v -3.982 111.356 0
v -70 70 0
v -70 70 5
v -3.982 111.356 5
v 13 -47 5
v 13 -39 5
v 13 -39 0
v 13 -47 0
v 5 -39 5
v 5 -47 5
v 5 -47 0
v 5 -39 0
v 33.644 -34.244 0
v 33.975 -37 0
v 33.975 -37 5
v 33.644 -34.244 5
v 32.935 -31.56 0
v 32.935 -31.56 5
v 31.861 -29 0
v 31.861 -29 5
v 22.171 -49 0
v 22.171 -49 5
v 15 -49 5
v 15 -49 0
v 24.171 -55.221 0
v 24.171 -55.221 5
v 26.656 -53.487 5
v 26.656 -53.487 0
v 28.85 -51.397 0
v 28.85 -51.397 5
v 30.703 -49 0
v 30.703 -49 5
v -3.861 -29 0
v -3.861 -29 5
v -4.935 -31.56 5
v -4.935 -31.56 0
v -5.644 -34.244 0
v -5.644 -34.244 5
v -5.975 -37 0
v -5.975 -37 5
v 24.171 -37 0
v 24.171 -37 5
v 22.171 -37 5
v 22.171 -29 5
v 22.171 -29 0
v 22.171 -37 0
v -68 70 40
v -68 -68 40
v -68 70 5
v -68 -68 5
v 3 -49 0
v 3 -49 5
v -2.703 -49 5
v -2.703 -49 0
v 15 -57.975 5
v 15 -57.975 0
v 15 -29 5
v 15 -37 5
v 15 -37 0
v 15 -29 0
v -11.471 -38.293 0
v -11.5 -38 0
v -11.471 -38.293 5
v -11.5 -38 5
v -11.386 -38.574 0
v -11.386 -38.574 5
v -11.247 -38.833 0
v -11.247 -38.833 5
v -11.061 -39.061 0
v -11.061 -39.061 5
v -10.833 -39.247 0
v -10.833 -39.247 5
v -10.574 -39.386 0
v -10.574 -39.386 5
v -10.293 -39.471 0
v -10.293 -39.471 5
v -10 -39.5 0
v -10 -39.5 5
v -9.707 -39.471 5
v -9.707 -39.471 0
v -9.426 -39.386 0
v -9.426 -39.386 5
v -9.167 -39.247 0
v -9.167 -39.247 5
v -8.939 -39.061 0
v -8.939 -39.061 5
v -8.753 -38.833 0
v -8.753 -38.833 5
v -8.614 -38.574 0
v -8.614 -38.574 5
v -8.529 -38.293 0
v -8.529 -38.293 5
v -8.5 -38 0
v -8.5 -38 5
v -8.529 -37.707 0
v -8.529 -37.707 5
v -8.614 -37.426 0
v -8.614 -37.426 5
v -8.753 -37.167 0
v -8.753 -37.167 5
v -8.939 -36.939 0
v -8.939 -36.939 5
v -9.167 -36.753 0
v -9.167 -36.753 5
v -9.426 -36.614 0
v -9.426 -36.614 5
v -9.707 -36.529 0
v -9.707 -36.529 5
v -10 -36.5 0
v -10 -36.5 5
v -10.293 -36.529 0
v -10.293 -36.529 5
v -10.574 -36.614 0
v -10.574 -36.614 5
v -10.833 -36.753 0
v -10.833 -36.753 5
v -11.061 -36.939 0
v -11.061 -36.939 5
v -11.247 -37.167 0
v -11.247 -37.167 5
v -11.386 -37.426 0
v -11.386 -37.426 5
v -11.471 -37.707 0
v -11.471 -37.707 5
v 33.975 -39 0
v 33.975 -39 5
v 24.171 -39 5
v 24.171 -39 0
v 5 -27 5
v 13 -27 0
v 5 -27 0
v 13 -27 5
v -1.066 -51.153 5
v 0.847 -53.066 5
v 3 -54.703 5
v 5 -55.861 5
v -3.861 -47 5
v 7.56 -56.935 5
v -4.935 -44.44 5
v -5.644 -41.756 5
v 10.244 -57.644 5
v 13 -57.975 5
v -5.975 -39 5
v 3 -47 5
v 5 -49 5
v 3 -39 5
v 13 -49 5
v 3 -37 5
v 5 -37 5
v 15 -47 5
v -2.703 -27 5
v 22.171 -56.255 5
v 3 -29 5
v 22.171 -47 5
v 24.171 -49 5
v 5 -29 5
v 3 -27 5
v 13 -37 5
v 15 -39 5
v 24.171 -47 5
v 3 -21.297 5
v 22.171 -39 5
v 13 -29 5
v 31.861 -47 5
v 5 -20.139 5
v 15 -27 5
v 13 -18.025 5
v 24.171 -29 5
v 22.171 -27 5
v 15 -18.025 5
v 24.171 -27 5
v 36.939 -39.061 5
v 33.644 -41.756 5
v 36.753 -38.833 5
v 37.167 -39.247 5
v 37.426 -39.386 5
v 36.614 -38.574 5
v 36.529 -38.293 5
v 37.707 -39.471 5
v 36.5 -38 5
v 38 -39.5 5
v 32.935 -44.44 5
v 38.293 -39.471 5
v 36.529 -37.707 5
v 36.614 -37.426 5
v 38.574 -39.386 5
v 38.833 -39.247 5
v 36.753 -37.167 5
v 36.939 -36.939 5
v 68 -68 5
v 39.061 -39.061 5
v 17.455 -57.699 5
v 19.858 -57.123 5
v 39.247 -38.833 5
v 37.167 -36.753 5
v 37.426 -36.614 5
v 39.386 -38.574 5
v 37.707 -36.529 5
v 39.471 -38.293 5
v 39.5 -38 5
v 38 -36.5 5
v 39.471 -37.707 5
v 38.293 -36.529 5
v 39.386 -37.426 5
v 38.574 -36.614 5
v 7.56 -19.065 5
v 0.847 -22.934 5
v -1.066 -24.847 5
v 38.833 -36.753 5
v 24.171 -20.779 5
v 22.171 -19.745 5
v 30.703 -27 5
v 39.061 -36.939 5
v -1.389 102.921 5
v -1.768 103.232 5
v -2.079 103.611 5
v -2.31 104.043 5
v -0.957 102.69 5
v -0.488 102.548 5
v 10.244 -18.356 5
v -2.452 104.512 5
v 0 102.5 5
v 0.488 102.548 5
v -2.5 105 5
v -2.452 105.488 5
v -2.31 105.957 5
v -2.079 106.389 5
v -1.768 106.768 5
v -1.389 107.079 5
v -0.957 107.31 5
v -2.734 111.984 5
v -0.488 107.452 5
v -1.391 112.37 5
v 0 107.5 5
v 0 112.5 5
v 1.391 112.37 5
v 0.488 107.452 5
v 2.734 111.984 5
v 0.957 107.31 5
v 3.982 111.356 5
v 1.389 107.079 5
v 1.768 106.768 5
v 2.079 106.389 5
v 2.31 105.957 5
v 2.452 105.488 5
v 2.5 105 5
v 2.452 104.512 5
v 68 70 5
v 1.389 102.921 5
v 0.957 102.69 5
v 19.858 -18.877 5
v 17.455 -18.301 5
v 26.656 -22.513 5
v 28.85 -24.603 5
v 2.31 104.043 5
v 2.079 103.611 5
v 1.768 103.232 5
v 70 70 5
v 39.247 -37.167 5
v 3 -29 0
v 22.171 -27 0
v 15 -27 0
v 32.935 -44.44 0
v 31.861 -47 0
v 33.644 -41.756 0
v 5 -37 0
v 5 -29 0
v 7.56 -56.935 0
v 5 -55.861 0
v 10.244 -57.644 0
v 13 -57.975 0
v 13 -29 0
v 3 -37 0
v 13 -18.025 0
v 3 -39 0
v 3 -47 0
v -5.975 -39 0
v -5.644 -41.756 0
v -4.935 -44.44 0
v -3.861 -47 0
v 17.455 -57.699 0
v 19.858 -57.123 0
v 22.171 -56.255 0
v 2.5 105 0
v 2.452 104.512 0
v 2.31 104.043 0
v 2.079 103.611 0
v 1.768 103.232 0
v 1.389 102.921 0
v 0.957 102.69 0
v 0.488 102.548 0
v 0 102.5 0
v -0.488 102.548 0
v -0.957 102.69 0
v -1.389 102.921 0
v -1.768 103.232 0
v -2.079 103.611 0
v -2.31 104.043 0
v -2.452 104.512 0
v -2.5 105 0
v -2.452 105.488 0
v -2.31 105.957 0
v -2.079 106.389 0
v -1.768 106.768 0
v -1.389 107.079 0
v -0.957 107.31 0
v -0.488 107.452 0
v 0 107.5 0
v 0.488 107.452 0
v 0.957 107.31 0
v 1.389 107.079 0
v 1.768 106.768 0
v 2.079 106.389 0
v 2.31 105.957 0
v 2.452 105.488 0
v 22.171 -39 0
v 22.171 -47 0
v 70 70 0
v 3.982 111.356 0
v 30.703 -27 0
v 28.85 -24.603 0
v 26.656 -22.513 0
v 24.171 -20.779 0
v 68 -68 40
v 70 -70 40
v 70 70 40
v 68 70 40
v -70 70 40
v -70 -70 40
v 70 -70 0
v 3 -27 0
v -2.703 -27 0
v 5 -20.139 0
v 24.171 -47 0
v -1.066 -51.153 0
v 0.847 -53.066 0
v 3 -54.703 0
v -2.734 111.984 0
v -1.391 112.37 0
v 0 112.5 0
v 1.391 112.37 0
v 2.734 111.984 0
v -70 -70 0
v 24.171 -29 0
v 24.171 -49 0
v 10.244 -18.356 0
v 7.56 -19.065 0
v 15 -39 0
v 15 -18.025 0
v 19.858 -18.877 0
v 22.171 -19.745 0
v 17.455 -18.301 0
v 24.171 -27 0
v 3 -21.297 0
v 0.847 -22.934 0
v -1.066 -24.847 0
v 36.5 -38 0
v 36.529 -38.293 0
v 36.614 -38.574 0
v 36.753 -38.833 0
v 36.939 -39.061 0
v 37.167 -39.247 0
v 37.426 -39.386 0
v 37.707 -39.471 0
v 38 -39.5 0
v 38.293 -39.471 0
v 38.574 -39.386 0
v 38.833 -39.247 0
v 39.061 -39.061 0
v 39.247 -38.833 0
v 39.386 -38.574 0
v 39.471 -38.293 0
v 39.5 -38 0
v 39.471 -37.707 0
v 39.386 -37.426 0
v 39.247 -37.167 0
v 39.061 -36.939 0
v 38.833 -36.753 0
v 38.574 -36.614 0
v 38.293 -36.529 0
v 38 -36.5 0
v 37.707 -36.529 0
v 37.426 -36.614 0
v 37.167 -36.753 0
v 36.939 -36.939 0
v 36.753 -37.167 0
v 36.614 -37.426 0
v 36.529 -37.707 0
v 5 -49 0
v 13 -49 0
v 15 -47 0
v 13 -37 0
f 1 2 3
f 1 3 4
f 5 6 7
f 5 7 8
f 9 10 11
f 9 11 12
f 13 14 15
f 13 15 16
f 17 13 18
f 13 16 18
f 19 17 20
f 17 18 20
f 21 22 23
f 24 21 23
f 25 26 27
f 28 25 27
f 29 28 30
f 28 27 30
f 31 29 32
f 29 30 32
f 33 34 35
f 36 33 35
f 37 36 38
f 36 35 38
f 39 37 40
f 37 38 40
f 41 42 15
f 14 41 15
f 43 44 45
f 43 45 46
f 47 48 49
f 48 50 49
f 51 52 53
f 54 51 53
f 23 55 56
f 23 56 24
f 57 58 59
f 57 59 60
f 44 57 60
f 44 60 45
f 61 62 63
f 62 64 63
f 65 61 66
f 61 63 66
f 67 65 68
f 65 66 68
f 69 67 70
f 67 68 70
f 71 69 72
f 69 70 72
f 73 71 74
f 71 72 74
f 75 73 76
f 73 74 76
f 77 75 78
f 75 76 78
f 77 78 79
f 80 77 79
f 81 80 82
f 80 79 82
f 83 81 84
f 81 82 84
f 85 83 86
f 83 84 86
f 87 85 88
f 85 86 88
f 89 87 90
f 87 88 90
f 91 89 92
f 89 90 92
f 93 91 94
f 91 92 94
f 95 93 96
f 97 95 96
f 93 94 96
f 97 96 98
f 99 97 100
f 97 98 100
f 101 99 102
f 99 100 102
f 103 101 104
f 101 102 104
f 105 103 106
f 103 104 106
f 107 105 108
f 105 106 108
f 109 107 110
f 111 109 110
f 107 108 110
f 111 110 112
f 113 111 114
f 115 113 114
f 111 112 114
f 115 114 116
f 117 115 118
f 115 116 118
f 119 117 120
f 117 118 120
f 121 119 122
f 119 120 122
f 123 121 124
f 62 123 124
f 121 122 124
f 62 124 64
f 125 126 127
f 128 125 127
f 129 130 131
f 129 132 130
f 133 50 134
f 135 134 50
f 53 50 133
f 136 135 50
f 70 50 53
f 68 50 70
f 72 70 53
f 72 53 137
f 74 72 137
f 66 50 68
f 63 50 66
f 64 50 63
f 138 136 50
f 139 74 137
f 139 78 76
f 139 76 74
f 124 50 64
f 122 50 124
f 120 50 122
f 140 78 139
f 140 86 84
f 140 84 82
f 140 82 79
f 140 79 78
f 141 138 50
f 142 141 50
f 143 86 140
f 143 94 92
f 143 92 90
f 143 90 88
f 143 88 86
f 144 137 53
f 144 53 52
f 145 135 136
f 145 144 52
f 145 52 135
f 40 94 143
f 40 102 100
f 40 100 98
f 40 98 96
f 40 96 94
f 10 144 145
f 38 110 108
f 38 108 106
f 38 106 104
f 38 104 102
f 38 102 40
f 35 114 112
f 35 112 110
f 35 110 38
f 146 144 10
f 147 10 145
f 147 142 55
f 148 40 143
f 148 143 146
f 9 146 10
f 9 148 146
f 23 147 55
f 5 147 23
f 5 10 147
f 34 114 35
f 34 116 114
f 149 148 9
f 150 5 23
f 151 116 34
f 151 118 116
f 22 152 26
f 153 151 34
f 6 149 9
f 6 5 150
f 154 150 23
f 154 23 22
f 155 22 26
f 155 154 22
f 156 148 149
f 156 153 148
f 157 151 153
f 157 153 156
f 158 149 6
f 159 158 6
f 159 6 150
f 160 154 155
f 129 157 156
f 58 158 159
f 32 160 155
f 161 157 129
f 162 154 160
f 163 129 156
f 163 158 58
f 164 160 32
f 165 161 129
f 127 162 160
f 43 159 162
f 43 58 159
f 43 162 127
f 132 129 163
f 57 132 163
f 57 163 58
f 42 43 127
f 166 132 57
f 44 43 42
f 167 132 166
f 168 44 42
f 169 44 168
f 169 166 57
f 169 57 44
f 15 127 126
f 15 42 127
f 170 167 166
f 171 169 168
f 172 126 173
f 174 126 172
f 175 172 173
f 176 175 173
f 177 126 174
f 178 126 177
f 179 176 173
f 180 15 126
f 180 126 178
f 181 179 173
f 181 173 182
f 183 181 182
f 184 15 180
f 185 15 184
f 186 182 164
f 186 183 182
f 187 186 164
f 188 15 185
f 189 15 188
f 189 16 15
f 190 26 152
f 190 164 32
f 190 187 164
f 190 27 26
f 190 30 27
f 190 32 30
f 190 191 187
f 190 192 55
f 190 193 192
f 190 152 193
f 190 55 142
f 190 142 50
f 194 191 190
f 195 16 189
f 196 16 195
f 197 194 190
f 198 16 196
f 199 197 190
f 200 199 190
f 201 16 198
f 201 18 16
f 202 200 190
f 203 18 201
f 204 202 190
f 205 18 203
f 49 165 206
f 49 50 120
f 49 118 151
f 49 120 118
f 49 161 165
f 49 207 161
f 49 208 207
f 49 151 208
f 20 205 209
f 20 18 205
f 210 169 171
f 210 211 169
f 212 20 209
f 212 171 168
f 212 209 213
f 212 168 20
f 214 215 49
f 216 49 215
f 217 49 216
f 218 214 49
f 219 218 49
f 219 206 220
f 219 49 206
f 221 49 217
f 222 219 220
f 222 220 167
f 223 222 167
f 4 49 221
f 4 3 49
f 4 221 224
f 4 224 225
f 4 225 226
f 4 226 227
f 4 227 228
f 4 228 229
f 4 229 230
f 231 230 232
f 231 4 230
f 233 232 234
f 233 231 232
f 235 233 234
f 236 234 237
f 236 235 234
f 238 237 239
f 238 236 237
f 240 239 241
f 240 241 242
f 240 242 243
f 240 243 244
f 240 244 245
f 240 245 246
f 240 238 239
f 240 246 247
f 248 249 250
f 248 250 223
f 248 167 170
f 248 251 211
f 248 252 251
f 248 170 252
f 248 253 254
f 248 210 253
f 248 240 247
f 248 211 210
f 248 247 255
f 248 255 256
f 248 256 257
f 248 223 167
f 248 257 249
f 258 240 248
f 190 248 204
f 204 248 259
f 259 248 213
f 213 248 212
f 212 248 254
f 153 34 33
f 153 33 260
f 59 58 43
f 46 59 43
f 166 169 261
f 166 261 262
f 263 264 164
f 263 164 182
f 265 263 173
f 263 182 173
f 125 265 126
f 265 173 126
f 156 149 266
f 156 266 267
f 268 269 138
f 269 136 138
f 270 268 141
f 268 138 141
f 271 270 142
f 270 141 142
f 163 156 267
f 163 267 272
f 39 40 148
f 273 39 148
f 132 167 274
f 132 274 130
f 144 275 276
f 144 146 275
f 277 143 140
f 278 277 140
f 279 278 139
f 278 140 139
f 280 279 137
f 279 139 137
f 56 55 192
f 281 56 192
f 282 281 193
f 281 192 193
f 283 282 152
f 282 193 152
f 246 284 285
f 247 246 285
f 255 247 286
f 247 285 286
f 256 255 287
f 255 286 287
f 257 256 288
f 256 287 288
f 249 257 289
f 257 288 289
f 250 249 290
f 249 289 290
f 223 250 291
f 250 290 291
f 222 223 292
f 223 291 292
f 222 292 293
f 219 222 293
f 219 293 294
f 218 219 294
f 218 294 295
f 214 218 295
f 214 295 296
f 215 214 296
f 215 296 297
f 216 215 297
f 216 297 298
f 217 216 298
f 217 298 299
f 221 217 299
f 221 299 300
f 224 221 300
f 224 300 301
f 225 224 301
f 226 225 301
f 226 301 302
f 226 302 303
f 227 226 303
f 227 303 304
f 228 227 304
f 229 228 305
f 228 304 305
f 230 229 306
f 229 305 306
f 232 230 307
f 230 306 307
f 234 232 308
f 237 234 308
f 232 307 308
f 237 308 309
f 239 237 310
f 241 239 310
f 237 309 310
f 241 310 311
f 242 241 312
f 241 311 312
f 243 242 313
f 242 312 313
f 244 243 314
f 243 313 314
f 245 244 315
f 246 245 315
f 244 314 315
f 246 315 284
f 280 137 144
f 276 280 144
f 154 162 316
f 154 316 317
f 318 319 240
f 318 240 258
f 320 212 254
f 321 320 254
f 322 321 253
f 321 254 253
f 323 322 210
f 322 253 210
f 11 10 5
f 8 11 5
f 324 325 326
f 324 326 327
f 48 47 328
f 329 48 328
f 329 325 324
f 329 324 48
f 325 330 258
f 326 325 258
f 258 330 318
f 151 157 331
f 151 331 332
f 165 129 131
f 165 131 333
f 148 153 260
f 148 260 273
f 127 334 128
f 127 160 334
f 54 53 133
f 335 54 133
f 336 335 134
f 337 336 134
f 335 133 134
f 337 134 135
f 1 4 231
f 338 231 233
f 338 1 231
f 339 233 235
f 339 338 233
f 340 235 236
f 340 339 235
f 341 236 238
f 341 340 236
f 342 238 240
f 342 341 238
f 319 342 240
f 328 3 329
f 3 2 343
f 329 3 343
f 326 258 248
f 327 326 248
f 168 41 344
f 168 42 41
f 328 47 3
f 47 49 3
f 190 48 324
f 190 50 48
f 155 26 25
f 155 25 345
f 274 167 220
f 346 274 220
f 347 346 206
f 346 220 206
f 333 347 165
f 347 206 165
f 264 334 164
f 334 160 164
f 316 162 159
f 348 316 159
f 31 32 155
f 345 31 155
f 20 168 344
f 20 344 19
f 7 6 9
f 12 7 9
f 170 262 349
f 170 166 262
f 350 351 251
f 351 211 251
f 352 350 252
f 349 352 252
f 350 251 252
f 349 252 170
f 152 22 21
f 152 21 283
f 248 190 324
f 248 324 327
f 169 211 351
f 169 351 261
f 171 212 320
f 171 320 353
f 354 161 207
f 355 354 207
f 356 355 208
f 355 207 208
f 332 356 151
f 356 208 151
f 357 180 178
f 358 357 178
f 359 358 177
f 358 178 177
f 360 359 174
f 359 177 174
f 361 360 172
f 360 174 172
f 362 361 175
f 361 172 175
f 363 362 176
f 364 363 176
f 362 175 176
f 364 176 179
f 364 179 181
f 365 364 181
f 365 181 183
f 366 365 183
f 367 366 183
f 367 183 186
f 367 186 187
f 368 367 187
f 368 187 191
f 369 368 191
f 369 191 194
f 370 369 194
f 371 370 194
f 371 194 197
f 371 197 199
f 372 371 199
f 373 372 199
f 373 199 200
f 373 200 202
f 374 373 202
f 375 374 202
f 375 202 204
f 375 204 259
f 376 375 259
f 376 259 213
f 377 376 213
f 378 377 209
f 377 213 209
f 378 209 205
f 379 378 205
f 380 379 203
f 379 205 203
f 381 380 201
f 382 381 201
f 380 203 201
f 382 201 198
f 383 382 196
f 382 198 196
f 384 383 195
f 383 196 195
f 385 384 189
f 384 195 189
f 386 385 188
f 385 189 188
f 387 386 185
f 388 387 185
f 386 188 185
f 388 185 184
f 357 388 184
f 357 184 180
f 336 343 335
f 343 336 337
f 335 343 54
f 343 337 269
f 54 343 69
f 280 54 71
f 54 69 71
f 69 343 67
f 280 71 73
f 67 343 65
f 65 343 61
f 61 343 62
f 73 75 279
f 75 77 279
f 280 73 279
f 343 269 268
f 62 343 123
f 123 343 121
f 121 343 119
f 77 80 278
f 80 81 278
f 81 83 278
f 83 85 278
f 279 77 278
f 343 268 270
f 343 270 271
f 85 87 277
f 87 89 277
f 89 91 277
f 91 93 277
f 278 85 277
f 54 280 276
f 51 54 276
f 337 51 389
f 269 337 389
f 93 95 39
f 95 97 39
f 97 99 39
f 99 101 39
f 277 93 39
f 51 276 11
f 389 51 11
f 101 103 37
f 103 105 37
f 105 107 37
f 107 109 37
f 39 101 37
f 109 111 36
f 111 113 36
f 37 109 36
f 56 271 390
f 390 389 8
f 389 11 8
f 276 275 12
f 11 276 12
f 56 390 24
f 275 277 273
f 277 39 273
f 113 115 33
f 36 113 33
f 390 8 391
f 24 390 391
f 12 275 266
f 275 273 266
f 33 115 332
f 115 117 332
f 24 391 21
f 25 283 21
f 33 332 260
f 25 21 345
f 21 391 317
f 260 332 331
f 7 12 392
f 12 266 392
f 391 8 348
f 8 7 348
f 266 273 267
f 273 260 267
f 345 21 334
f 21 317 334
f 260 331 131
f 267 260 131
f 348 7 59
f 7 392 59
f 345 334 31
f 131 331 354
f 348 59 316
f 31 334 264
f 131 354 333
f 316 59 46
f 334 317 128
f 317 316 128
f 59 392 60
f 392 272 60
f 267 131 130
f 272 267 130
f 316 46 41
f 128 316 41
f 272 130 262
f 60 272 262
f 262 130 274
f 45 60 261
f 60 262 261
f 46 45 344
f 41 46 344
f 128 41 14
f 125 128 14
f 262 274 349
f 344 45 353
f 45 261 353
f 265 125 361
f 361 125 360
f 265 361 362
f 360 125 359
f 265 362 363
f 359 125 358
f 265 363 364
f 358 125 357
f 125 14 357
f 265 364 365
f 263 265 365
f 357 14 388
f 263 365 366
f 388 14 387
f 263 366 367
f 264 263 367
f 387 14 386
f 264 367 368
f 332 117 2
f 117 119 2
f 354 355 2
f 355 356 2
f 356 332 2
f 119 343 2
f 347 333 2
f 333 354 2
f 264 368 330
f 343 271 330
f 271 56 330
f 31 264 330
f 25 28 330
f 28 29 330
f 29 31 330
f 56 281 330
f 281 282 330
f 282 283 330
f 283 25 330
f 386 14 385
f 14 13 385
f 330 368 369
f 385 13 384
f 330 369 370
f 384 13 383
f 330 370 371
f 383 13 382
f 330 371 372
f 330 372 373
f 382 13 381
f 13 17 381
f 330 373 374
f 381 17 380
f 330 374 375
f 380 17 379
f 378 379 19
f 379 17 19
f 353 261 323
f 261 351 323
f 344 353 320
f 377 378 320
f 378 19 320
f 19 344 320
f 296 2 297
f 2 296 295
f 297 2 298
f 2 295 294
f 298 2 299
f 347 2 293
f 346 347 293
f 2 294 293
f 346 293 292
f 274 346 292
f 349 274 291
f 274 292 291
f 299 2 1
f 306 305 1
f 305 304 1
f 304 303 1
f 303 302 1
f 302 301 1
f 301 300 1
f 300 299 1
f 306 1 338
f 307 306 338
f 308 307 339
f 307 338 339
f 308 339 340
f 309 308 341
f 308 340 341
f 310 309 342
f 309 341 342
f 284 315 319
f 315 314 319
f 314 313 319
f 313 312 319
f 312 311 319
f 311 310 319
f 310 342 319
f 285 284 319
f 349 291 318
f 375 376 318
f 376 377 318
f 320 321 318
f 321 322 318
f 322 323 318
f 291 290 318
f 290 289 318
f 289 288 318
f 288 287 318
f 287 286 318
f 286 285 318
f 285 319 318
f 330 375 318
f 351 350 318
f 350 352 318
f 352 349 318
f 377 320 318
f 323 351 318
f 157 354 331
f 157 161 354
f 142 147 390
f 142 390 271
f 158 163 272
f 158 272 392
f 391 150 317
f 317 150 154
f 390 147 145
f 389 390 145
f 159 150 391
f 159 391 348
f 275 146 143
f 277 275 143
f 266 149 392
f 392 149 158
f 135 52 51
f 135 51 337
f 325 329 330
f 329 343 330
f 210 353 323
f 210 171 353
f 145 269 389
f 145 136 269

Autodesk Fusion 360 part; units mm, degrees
sketch "Sketch1" plane through (0, 0, 0) normal (0, 0, 1) x (1, 0, 0)
  line L0 (70, 70) -> (-70, 70)
  line L1 (-70, 70) -> (-70, -70)
  line L2 (-70, -70) -> (70, -70)
  line L3 (70, -70) -> (70, 70)
  line L4 (70, 70) -> (-70, -70) construction
  line L5 (-70, 70) -> (70, -70) construction
  line L6 (0, 70) -> (0, 105)
  line L7 (0, 105) -> (0, 112.5)
  circle A0 centre (0, 105) radius 7.5
  line L8 (-70, 70) -> (-3.9815, 111.3559)
  line L9 (3.9815, 111.3559) -> (70, 70)
  circle A1 centre (0, 105) radius 2.5
  dimension "d1" = 140
  dimension "d2" = 140
  dimension "d3" = 35
  dimension "d4" = 7.5
  dimension "d5" = 5
extrude "Extrude1" add sketch "Sketch1" along normal blind 5 contours L0 L1 L2 L3 | L0 L6 A0 L9 | L0 L6 A0 L8 | L6 L7 A0 A1 | L6 L7 A0 A1
sketch "Sketch2" plane through (0, 0, 5) normal (0, 0, 1) x (-1, 0, 0)
  circle A0 centre (0, -105) radius 2.5
  line L0 (70, -70) -> (70, 70)
  line L1 (70, 70) -> (-70, 70)
  line L2 (-70, 70) -> (-70, -70)
  line L3 (-70, -70) -> (-3.9815, -111.3559)
  arc A1 (-3.9815, -111.3559) -> (3.9815, -111.3559) centre (0, -105) ccw
  line L4 (3.9815, -111.3559) -> (70, -70)
  line L5 (70, -70) -> (70, 70)
  line L6 (70, 70) -> (-70, 70)
  line L7 (-70, 70) -> (-70, -70)
  line L8 (68, 68) -> (-68, 68)
  line L9 (-68, 68) -> (-68, -68)
  line L10 (68, -68) -> (68, 68)
  line L11 (68, -68) -> (68, -70)
  line L12 (-68, -68) -> (-68, -70)
  line L13 (-70, -70) -> (-68, -70)
  line L14 (68, -70) -> (70, -70)
  dimension "d8" = 2
  dimension "d9" = 2
  dimension "d10" = 2
extrude "Extrude2" add sketch "Sketch2" along normal blind 35 contours L0 L1 L2 L5 L6 L7 L8 L9 L10 L11 L12 L13 L14
sketch "Sketch3" plane through (0, 0, 5) normal (0, 0, 1) x (-1, 0, 0)
  line L0 (-68, -70) -> (-70, -70)
  line L1 (-70, -70) -> (-3.9815, -111.3559)
  arc A0 (-3.9815, -111.3559) -> (3.9815, -111.3559) centre (0, -105) ccw
  line L2 (3.9815, -111.3559) -> (70, -70)
  line L3 (70, -70) -> (68, -70)
  line L4 (68, -70) -> (68, 68)
  line L5 (68, 68) -> (-68, 68)
  line L6 (-68, 68) -> (-68, -70)
  circle A1 centre (0, -105) radius 2.5
  circle A2 centre (-38, 38) radius 1.5
  line L7 (-38, 38) -> (10, 38)
  circle A3 centre (10, 38) radius 1.5
  circle A4 centre (-14, 38) radius 20
  line L8 (-14, 58) -> (-14, 18)
  line L9 (-13, 58) -> (-15, 58)
  line L10 (-15, 58) -> (-15, 18)
  line L11 (-15, 18) -> (-13, 18)
  line L12 (-13, 18) -> (-13, 58)
  line L13 (-13, 58) -> (-15, 18) construction
  line L14 (-15, 58) -> (-13, 18) construction
  line L15 (6, 37) -> (-34, 37)
  line L16 (-34, 37) -> (-34, 39)
  line L17 (-34, 39) -> (6, 39)
  line L18 (6, 39) -> (6, 37)
  line L19 (6, 37) -> (-34, 39) construction
  line L20 (-34, 37) -> (6, 39) construction
  line L21 (-14, 38) -> (-23.1711, 38)
  line L22 (-14, 38) -> (-23.1711, 38)
  line L23 (-24, 20.6795) -> (-24, 55.3205)
  line L24 (-24.1711, 55.2206) -> (-24.1711, 20.7794)
  line L25 (-22.1711, 19.7453) -> (-22.1711, 56.2547)
  line L26 (-22.9946, 55.8633) -> (-23.3458, 20.3179) construction
  line L27 (-23.3458, 55.6821) -> (-22.9946, 20.1367) construction
  line L28 (-14, 38) -> (-4, 38)
  line L29 (-5, 55.8606) -> (-5, 20.1394)
  line L30 (-3, 21.2967) -> (-3, 54.7033)
  line L31 (-3.3211, 54.9104) -> (-4.7111, 20.288) construction
  line L32 (-4.7111, 55.712) -> (-3.3211, 21.0896) construction
  line L33 (-14, 38) -> (-14, 48)
  line L34 (3.8606, 47) -> (-31.8606, 47)
  line L35 (-30.7033, 49) -> (2.7033, 49)
  line L36 (3.8606, 47) -> (-30.7443, 48.9375) construction
  line L37 (-31.8606, 47) -> (2.7443, 48.9375) construction
  line L38 (-14, 38) -> (-14, 28)
  line L39 (3.8606, 29) -> (-31.8606, 29)
  line L40 (-30.7033, 27) -> (2.7033, 27)
  line L41 (3.7436, 28.7715) -> (-30.8756, 27.2663) construction
  line L42 (-31.7436, 28.7715) -> (2.8756, 27.2663) construction
  point P0 (-14, 38)
  point P1 (-14, 38)
  point P2 (-23.1711, 38)
  point P3 (-4, 38)
  point P4 (-14, 48)
  point P5 (-14, 28)
  dimension "d14" = 3
  dimension "d15" = 30
  dimension "d16" = 30
  dimension "d17" = 48
  dimension "d18" = 3
  dimension "d19" = 40
  dimension "d22" = 40
  dimension "d23" = 2
  dimension "d24" = 40
  dimension "d25" = 2
  dimension "d27" = 10
  dimension "d30" = 10
  dimension "d32" = 10
extrude "Extrude4" cut sketch "Sketch3" against normal blind 10 contours A2 | A3 | A4 L17 L24 L34 | A4 L15 L24 L39 | A4 L24 L35 | A4 L24 L40 | L10 L15 L25 L39 | L10 L17 L25 L34 | A4 L10 L25 L40 | A4 L10 L25 L35 | L12 L15 L29 L39 | L12 L17 L29 L34 | A4 L12 L29 L40 | A4 L15 L30 L39 | A4 L12 L29 L35 | A4 L17 L30 L34 | A4 L30 L40 | A4 L30 L35
extrude "Extrude3" [suppressed]
